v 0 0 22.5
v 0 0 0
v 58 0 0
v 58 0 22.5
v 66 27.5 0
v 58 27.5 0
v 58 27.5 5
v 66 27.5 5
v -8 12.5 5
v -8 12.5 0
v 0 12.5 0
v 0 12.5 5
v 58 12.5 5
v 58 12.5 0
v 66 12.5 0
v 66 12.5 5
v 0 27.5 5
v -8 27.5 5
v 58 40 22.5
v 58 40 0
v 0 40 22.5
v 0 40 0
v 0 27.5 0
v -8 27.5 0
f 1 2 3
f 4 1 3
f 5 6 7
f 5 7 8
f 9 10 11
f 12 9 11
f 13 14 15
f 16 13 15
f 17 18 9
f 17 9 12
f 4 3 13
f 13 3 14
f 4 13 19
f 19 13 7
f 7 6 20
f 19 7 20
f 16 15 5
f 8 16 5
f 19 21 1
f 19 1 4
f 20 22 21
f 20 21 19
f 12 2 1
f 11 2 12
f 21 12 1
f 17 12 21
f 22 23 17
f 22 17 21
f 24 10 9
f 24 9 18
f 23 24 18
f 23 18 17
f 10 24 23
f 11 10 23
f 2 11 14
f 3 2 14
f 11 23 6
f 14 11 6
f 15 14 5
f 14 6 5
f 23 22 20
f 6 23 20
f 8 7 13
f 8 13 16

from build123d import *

# Parameters (mm, degrees)
BOX002_W     = 8
BOX002_H     = 15
BOX002_DEPTH = 5
BOX001_W     = 8
BOX001_H     = 15
BOX001_DEPTH = 5
BOX_W        = 58
BOX_H        = 40
BOX_DEPTH    = 22.5


with BuildPart() as w_rfel002:
    # Box002 → Box002 (new body)
    with BuildSketch(Plane(origin=(-8, 12.5, 0), x_dir=(1, 0, 0), z_dir=(0, 0, 1))):
        with Locations((4, 7.5)):
            Rectangle(BOX002_W, BOX002_H)
    extrude(amount=BOX002_DEPTH)


with BuildPart() as w_rfel001:
    # Box001 → Box001 (new body)
    with BuildSketch(Plane(origin=(58, 12.5, 0), x_dir=(1, 0, 0), z_dir=(0, 0, 1))):
        with Locations((4, 7.5)):
            Rectangle(BOX001_W, BOX001_H)
    extrude(amount=BOX001_DEPTH)


with BuildPart() as fusion:
    # Box → Box (new body)
    with BuildSketch(Plane.XY):
        with Locations((29, 20)):
            Rectangle(BOX_W, BOX_H)
    extrude(amount=BOX_DEPTH)

    # Fusion: union Würfel002, Würfel001
    add(w_rfel002.part)
    add(w_rfel001.part)


solid = fusion.part
